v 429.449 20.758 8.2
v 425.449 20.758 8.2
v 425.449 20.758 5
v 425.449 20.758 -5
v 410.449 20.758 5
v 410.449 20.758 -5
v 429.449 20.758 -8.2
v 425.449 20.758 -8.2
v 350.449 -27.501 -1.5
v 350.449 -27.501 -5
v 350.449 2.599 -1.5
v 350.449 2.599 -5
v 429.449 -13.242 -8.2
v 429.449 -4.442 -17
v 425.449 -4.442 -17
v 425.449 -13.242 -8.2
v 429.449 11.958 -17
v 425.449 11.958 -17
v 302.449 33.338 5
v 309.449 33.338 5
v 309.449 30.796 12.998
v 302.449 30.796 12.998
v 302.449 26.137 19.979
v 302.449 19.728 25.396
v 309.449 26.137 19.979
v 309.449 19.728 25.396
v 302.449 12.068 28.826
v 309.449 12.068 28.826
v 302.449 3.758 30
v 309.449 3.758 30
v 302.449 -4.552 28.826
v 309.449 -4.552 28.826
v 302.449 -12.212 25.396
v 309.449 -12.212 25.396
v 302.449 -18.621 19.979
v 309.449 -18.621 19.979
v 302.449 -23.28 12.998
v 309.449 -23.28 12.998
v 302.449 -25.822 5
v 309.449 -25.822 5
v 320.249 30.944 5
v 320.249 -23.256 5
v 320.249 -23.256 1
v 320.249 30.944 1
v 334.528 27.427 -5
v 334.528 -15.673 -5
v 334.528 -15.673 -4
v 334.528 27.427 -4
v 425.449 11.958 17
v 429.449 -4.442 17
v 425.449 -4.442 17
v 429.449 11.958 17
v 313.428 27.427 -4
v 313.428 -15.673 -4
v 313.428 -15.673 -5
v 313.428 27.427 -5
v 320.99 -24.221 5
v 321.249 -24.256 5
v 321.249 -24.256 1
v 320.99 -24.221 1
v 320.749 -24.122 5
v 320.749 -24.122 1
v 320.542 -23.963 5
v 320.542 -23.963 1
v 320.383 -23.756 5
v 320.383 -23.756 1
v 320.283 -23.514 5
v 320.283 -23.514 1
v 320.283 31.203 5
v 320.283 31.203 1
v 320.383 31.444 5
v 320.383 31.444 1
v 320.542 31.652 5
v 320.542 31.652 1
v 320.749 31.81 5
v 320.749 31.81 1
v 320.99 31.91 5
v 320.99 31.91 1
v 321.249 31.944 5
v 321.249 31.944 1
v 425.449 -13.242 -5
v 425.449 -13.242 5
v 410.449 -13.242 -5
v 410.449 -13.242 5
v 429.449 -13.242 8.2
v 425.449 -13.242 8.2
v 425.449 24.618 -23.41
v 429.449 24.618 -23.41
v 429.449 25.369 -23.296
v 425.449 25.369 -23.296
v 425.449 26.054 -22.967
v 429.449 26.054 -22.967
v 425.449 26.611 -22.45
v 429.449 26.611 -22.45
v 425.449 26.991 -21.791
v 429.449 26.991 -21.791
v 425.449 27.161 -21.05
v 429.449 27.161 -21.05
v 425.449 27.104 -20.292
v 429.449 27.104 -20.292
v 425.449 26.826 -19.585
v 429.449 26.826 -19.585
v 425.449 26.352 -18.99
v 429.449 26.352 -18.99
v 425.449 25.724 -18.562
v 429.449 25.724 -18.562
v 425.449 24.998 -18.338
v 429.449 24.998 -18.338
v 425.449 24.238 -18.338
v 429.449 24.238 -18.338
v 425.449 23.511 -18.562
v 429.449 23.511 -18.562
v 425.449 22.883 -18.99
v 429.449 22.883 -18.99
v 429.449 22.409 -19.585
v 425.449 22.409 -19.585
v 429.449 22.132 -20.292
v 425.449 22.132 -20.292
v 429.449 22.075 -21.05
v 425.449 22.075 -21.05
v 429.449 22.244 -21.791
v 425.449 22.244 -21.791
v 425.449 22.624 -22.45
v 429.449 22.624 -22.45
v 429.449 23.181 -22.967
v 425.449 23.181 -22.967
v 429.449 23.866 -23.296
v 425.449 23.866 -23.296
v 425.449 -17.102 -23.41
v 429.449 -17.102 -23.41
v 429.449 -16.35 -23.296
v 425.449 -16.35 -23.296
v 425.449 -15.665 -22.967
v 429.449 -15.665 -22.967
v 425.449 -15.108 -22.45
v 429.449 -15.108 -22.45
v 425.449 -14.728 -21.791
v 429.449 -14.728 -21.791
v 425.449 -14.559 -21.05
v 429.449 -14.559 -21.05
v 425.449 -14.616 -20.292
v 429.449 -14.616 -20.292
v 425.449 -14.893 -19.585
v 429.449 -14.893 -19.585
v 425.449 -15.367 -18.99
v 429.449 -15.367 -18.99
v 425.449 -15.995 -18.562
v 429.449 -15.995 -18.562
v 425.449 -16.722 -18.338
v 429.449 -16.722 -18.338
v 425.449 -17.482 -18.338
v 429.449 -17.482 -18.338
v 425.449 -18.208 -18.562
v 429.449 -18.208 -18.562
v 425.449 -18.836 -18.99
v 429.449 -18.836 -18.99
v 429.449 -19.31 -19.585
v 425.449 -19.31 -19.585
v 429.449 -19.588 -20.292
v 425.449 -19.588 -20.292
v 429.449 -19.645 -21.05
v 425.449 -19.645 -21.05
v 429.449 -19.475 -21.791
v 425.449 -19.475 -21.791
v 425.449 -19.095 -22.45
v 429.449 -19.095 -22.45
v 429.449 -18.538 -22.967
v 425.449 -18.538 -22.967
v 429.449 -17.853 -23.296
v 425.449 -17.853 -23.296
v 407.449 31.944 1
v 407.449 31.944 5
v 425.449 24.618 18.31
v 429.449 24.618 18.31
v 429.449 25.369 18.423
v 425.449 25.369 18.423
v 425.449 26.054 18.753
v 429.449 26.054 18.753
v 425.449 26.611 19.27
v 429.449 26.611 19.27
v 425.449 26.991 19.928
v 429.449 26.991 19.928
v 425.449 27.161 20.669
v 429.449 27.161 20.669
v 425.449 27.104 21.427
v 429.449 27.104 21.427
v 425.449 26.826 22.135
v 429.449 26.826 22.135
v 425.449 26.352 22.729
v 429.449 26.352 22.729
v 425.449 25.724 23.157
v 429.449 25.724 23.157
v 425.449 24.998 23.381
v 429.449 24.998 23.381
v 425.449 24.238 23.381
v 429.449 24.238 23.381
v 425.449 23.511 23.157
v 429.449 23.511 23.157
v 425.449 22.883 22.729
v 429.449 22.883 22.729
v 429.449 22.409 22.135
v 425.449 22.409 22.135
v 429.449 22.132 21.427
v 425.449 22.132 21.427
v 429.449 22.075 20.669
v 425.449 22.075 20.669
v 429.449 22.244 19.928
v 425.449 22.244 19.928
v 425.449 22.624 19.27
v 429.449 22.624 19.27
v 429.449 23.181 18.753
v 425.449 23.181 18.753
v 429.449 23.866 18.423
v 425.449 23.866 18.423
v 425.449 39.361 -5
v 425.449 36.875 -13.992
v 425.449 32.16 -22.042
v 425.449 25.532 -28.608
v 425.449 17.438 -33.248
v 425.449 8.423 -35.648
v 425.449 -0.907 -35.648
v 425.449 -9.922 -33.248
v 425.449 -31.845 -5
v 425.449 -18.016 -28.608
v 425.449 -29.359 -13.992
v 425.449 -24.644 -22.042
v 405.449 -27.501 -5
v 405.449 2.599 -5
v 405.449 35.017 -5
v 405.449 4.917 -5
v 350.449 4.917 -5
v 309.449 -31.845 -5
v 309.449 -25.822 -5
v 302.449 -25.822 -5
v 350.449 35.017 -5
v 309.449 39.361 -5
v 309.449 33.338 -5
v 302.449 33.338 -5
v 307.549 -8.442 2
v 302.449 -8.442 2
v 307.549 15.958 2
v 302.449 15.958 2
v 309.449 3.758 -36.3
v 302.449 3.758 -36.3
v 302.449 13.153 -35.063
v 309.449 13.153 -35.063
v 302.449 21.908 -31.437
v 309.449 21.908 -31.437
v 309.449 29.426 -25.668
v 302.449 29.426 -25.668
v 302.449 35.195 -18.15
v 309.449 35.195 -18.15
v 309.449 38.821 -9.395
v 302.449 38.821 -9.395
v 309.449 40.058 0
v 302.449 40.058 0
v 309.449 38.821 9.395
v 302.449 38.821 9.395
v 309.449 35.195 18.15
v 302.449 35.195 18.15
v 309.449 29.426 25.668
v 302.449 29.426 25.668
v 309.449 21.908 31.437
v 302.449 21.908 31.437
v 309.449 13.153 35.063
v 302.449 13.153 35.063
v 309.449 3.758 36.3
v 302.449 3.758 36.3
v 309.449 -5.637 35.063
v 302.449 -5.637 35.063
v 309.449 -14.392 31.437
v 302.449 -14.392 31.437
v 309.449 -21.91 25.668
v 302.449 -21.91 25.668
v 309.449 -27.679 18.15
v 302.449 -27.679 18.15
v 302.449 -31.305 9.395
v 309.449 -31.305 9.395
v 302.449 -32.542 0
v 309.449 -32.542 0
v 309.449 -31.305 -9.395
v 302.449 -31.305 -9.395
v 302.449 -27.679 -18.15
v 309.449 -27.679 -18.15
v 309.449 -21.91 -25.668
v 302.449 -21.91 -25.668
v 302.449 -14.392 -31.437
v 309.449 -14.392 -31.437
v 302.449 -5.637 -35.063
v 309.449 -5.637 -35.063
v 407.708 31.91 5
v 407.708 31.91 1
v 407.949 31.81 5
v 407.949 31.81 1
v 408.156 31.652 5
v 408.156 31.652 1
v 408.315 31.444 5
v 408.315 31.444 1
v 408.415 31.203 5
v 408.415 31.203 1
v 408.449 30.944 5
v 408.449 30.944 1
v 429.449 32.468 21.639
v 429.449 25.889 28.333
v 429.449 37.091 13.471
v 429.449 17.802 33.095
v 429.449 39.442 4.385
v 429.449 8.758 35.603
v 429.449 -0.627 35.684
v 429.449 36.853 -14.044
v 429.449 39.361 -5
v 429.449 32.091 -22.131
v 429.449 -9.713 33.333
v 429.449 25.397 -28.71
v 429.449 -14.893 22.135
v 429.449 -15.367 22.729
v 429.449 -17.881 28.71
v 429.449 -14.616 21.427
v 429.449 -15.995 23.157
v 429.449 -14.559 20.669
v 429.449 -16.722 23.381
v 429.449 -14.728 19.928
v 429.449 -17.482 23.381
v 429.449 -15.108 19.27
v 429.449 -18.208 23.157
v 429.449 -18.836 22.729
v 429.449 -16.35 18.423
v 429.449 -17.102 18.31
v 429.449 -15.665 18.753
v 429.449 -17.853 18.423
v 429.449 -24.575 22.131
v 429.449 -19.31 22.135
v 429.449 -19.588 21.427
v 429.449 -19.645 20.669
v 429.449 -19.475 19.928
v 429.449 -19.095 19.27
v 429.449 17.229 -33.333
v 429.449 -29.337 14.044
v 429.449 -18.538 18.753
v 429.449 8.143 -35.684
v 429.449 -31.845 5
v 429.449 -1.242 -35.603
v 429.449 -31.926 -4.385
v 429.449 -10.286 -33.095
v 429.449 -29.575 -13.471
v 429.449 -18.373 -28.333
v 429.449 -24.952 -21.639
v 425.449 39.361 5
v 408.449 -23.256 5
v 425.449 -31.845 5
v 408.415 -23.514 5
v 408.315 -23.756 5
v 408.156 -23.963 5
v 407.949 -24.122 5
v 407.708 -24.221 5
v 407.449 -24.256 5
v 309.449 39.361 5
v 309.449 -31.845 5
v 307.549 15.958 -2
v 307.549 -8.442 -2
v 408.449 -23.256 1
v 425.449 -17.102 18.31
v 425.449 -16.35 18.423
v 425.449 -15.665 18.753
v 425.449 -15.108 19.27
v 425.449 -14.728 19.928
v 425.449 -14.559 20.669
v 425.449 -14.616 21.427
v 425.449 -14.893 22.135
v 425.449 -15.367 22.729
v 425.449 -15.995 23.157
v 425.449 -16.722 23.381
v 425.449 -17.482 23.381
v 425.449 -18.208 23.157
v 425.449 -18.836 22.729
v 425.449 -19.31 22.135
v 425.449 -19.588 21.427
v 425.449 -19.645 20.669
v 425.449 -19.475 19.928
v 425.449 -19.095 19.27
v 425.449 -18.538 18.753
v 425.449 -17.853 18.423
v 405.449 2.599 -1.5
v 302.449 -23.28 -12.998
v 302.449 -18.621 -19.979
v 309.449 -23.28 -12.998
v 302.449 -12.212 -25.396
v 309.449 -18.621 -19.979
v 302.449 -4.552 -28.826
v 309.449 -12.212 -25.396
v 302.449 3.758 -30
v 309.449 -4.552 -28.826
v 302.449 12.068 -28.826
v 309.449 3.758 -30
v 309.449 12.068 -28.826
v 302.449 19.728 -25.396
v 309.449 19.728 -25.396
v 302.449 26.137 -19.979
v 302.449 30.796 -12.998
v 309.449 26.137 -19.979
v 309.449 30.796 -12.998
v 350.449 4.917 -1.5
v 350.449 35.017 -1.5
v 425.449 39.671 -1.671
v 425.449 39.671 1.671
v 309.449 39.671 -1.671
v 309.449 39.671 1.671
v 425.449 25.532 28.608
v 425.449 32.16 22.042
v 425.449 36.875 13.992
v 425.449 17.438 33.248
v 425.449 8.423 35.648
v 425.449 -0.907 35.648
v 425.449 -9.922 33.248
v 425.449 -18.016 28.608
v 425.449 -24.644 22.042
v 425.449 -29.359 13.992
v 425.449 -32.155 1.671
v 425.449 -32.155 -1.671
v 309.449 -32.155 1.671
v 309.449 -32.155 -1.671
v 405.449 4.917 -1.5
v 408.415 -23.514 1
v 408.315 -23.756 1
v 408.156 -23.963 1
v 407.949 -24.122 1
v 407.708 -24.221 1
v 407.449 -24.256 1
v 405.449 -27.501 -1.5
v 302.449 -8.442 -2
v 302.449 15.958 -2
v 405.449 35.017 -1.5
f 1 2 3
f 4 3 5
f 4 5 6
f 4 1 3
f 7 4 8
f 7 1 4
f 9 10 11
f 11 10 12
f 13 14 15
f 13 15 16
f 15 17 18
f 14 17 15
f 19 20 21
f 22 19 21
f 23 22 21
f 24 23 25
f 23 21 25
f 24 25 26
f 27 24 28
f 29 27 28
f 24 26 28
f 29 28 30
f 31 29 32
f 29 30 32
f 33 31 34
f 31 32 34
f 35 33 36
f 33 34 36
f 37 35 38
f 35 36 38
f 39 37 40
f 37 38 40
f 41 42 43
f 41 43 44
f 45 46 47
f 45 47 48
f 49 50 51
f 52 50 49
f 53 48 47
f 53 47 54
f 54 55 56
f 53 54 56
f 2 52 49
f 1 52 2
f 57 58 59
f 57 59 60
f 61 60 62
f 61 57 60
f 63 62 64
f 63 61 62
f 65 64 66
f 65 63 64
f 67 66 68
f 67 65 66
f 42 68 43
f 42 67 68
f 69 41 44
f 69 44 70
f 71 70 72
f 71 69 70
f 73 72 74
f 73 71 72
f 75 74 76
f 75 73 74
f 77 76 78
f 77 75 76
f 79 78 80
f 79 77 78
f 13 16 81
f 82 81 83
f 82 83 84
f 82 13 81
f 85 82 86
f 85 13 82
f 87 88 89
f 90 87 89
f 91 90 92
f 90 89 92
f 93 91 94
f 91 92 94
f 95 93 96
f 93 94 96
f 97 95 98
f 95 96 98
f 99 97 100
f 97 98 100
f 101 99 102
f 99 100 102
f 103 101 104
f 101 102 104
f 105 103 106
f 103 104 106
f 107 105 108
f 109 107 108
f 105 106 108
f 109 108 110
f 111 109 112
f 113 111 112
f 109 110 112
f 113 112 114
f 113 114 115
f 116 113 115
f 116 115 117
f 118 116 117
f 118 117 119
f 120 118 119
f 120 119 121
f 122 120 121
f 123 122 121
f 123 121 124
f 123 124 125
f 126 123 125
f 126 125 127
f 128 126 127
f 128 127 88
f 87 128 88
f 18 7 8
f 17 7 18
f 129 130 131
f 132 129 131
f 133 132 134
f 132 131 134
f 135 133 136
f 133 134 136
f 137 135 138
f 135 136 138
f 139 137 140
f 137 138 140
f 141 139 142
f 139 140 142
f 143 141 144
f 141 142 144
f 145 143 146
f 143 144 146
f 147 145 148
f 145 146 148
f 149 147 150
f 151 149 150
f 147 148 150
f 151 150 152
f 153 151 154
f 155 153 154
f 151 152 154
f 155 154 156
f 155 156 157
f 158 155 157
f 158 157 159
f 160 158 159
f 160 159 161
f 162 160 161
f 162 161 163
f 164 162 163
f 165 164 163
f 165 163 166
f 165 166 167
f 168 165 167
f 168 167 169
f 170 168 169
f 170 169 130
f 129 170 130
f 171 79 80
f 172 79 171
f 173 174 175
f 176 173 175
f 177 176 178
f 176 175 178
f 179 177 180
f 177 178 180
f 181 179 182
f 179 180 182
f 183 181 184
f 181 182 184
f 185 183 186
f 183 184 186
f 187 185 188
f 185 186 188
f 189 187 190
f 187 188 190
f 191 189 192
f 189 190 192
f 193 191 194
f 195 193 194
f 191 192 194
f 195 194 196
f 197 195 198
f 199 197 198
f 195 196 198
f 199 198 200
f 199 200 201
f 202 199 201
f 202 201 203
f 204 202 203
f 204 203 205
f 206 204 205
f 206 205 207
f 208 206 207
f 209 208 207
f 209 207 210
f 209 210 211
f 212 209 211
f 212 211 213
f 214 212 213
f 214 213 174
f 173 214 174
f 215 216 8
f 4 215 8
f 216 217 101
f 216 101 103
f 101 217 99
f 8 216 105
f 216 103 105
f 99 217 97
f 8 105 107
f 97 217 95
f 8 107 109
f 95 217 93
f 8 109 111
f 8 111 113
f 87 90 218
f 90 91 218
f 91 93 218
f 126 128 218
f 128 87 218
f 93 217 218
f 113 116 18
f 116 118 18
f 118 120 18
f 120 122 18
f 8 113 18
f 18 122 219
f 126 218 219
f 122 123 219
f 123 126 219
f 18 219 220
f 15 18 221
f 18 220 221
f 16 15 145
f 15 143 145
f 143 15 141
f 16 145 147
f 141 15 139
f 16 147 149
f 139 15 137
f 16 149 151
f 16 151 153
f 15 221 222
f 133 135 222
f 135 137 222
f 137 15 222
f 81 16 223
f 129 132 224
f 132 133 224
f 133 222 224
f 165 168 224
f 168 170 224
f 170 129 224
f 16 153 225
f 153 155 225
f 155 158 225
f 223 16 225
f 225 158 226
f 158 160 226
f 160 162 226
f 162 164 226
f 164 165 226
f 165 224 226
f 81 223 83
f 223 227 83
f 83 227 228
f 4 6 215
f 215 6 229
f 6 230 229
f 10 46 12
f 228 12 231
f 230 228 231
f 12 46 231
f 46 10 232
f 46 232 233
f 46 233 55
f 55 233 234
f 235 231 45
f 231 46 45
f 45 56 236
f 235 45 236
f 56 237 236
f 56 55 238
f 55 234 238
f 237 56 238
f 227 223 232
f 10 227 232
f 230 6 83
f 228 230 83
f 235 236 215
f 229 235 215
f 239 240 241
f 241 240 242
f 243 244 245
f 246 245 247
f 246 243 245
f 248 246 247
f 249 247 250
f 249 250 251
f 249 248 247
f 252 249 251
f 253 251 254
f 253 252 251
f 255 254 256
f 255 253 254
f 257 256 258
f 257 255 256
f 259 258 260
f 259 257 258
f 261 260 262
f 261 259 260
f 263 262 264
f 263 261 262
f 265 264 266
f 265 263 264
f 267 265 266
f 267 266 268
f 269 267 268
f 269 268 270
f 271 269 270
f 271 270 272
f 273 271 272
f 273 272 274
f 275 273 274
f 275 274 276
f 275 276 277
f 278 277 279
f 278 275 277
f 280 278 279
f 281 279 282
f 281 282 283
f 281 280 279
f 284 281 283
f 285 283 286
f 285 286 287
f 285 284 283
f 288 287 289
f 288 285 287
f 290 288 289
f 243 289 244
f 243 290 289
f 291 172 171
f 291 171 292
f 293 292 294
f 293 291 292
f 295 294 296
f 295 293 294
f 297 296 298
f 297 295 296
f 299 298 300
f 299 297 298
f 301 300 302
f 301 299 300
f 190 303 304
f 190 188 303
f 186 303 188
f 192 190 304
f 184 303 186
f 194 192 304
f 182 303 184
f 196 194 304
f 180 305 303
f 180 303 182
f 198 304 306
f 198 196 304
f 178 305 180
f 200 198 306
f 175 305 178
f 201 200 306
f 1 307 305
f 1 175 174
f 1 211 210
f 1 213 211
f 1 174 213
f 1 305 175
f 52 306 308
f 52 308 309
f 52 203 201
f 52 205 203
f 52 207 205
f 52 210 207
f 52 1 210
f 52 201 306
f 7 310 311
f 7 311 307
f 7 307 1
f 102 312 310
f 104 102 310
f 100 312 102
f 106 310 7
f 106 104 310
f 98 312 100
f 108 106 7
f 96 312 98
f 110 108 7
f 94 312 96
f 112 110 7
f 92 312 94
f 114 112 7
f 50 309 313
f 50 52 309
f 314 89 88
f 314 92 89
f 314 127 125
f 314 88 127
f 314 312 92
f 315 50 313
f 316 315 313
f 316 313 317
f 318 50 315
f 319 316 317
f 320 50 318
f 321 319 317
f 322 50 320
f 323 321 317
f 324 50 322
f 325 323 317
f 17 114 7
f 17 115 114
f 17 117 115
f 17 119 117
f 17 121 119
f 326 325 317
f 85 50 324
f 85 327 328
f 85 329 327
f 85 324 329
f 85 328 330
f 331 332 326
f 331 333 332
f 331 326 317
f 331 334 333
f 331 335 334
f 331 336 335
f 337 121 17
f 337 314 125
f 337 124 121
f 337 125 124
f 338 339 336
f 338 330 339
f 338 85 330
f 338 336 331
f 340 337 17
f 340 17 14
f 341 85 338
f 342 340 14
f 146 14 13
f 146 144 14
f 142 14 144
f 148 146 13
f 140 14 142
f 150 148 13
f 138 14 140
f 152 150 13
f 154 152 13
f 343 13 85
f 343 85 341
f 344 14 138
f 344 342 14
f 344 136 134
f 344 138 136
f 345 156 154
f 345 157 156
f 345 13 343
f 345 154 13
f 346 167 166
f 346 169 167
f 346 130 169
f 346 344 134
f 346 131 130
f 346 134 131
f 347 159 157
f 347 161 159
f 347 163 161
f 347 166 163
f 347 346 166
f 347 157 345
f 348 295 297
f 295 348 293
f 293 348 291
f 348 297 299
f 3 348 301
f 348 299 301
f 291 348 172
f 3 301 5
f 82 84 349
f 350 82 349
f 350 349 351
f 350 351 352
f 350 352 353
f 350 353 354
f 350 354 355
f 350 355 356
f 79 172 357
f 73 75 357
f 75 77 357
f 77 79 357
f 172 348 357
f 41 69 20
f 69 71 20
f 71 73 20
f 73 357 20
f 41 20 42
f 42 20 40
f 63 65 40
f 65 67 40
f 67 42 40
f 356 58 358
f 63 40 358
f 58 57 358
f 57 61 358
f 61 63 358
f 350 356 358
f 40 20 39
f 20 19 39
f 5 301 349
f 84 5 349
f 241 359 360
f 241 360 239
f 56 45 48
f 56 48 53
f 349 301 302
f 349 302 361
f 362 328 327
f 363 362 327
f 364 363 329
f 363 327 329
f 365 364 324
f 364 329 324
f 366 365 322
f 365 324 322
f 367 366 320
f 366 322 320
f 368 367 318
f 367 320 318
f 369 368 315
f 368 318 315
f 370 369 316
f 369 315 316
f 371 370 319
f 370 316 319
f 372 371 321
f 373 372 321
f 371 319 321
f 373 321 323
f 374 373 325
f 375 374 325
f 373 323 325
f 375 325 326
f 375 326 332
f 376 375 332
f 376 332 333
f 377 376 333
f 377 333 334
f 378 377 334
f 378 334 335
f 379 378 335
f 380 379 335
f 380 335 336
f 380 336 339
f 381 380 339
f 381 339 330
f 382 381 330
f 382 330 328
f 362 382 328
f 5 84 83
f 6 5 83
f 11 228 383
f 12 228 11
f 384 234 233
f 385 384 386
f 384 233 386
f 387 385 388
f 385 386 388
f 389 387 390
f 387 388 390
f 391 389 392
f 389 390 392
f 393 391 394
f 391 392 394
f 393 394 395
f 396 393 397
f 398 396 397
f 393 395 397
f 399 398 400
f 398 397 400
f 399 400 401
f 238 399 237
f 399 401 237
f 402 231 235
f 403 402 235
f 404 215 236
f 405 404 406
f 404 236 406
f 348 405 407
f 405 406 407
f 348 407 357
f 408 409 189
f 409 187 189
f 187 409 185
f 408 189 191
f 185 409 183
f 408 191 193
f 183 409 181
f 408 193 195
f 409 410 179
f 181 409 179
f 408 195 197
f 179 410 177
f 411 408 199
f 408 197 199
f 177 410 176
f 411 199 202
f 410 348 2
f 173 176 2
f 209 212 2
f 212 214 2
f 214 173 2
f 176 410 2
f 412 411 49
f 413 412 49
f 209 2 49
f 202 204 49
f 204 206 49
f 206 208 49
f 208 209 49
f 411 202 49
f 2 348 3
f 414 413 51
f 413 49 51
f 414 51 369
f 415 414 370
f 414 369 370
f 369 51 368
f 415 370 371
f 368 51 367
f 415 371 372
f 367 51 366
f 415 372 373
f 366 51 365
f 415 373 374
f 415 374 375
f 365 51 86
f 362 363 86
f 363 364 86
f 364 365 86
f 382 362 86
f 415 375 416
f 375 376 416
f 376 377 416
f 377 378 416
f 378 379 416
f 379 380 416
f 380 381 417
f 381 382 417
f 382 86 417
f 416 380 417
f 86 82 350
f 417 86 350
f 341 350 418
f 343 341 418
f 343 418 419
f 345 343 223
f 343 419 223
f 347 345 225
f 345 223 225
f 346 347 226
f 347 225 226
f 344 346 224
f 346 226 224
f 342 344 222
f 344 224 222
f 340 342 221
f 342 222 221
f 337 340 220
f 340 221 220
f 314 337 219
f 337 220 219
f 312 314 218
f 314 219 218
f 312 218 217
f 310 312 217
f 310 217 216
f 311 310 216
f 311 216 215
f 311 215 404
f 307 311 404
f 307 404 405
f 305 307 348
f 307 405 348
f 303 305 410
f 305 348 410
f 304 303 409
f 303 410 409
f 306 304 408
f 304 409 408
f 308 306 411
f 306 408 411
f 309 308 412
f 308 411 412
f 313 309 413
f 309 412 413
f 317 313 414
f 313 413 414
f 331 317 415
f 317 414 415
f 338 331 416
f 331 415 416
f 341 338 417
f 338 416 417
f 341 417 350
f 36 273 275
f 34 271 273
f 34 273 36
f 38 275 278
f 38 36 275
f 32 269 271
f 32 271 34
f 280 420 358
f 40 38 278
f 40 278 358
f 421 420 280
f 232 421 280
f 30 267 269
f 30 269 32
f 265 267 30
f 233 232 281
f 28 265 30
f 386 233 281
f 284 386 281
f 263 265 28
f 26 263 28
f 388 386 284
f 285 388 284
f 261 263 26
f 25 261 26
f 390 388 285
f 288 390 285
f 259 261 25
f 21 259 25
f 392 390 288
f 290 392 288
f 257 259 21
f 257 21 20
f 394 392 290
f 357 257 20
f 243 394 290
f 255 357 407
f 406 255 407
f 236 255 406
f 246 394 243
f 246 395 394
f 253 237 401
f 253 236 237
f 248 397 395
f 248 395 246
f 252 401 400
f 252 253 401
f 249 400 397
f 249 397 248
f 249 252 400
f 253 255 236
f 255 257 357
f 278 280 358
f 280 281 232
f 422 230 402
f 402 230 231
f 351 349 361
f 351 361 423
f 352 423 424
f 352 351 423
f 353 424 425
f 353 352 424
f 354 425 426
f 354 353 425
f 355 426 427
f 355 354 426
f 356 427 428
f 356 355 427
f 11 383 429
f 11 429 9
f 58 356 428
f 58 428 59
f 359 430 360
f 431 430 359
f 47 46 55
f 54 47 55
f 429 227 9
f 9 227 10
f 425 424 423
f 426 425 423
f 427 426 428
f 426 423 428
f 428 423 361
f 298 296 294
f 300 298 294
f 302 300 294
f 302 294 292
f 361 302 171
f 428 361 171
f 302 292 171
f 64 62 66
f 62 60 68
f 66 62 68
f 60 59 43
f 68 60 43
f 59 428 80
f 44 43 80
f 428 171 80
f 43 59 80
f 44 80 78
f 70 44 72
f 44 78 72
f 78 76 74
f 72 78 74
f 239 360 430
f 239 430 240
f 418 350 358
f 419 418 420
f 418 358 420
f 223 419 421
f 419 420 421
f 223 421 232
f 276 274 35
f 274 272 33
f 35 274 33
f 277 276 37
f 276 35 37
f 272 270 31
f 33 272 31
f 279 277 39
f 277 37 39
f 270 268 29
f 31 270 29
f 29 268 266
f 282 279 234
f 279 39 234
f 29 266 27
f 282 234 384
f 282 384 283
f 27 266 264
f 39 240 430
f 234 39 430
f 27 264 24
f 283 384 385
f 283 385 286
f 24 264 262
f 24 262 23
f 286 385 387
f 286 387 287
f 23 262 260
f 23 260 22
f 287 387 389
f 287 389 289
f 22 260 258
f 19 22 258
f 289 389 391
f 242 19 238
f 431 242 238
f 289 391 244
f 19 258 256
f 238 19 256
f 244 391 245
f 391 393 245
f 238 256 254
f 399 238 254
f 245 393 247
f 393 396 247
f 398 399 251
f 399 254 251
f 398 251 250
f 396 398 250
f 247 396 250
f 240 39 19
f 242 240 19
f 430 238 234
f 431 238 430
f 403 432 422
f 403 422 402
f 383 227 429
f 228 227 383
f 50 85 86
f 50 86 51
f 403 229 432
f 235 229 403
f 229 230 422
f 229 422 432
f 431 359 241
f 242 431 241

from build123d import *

# Parameters (mm, degrees)
CUT_EXTRUDE1_DEPTH      = 212.88306668
BOSS_EXTRUDE2_DEPTH     = 139.7
SKETCH9_R               = 35.95202499
BOSS_EXTRUDE3_DEPTH     = 4
CUT_EXTRUDE2_DEPTH      = 4
SKETCH11_W              = 10
SKETCH11_H              = 34
CUT_EXTRUDE3_DEPTH      = 15
RASPBERRY_PI_5_DEPTH    = 4
GPS_SLOT_DEPTH          = 5.1
SKETCH14_W              = 10
SKETCH14_H              = 16
MPU_DEPTH               = 434.220724454
ALTIMETER_DEPTH         = 434.220724454
ALTIMETER_DEPTH_BACK    = 3.54
SKETCH15_W              = 20
SKETCH15_H              = 15.34
SKETCH16_W              = 62.2
SKETCH16_H              = 25.5
PCA9685_DEPTH           = 2
SKETCH17_W              = 50
SKETCH17_H              = 27
ESP_32_1_DEPTH          = 5
SKETCH18_W              = 55
SKETCH18_H              = 30.1
BATTERY_1_DEPTH         = 3.5
SKETCH21_W              = 55
SKETCH21_H              = 30.1
BATTERY_2_DEPTH         = 3.5
SKETCH24_W              = 50
SKETCH24_H              = 27
ESP_32_MESHTASTIC_DEPTH = 5
SKETCH25_W              = 21.1
SKETCH25_H              = 43.1
STEP_DOWN_DEPTH         = 1
SKETCH26_W              = 50
SKETCH26_H              = 27
ESP_32_2_DEPTH          = 5
BOSS_EXTRUDE4_START     = -120
SKETCH27_R              = 36.3
SKETCH27_R_2            = 30
BOSS_EXTRUDE4_DEPTH     = 7
CUT_EXTRUDE4_START      = -127
SKETCH29_R              = 36.3
CUT_EXTRUDE4_DEPTH      = 226.865446219
SKETCH30_W              = 4
SKETCH30_H              = 24.4
CUT_EXTRUDE5_DEPTH      = 5.1
CUT_EXTRUDE6_REACH      = 140.027
SKETCH31_R              = 2.55


with BuildPart() as part:
    # Sketch3 → Revolve1 (revolve)
    with BuildSketch(Plane.XY):
        with BuildLine():
            Line((285.74876522, 39.710021262), (285.74876522, 3.757996272))
            Line((285.74876522, 3.757996272), (80.74876522, 3.757996272))
            Line((80.74876522, 3.757996272), (80.74876522, 19.634316044))
            add(Edge.make_bspline(
                [(80.74876522, 19.634316044), (82.347112552, 19.950400666), (85.636412123, 20.593859316), (92.311794173, 21.870421625), (109.164486257, 24.943674568), (127.867996046, 27.977765645), (146.633052135, 30.604670801), (163.733801994, 32.658467989), (174.004488004, 33.801497199), (184.284802392, 34.855212792), (194.57611333, 35.797171826), (204.876878825, 36.627240946), (213.466527777, 37.244314669), (220.34120026, 37.693162367), (227.218898943, 38.097179671), (233.238636081, 38.411453209), (238.400481516, 38.652791264), (242.701722554, 38.8352093), (246.145182192, 38.969923968), (249.584994627, 39.093417446), (253.03241088, 39.20568842), (256.467961578, 39.306735697), (259.924132141, 39.396558203), (263.346991762, 39.475154984), (266.82565511, 39.542525204), (270.211898057, 39.598668148), (273.756466178, 39.643583219), (276.60509147, 39.673059099), (279.43950326, 39.691306197), (281.597603414, 39.703938851), (283.942998009, 39.708617629), (285.03032454, 39.710021262), (285.74876522, 39.710021262)],
                knots=[0.322773044, 0.322773044, 0.322773044, 0.322773044, 0.322773044, 0.341563488, 0.3614269, 0.401153715, 0.520334158, 0.56006097, 0.579924379, 0.599787787, 0.639514601, 0.679241414, 0.699104823, 0.718968231, 0.738831638, 0.758695045, 0.778558452, 0.788490156, 0.798421859, 0.808353563, 0.818285267, 0.828216971, 0.838148675, 0.848080378, 0.858012082, 0.867943786, 0.87787549, 0.887807193, 0.897738897, 0.902704749, 0.9076706, 0.917602304, 0.917602304, 0.917602304, 0.917602304, 0.917602304], degree=4))
        make_face()
    revolve(axis=Axis((285.74876522, 3.757996272, 0), (-1, 0, 0)))

    # Sketch6 → Cut-Extrude1 (cut, through all)
    with BuildSketch(Plane(origin=(285.74876522, 0, 0), x_dir=(0, 0, -1), z_dir=(1, 0, 0))):
        with BuildLine():
            Line((-5, -31.844645496), (-5, 39.36063804))
            ThreePointArc((-5, 39.360638041), (-35.95202499, 3.757996272), (-5, -31.844645496))
        make_face()
        with BuildLine():
            ThreePointArc((35.95202499, 3.757996272), (27.132160123, 27.346001444), (5, 39.36063804))
            Line((5, 39.36063804), (5, -31.844645496))
            ThreePointArc((5, -31.844645496), (27.132160123, -19.830008899), (35.95202499, 3.757996272))
        make_face()
    extrude(amount=-CUT_EXTRUDE1_DEPTH, mode=Mode.SUBTRACT)

    # Sketch8 → Boss-Extrude2 (add)
    with BuildSketch(Plane(origin=(285.74876522, 0, 0), x_dir=(0, 0, -1), z_dir=(1, 0, 0))):
        with BuildLine():
            Line((5, -31.844645496), (5, 39.360638041))
            ThreePointArc((5, 39.360638041), (0, 39.710021262), (-5, 39.360638041))
            Line((-5, 39.360638041), (-5, -31.844645496))
            ThreePointArc((-5, -31.844645496), (0, -32.194028718), (5, -31.844645496))
        make_face()
    extrude(amount=BOSS_EXTRUDE2_DEPTH)

    # Sketch9 → Boss-Extrude3 (add)
    with BuildSketch(Plane(origin=(425.44876522, 0, 0), x_dir=(0, 0, -1), z_dir=(1, 0, 0))):
        with Locations(Location((0, 3.757996272, 0), (0, 0, 262.00572083))):
            Circle(SKETCH9_R)
    extrude(amount=BOSS_EXTRUDE3_DEPTH)

    # Sketch10 → Cut-Extrude2 (cut)
    with BuildSketch(Plane(origin=(429.44876522, 0, 0), x_dir=(0, 0, -1), z_dir=(1, 0, 0))):
        Polygon((-17, -4.442003728), (-17, 11.957996272), (-8.2, 20.757996272), (8.2, 20.757996272), (17, 11.957996272), (17, -4.442003728), (8.2, -13.242003728), (-8.2, -13.242003728), align=None)
    extrude(amount=-CUT_EXTRUDE2_DEPTH, mode=Mode.SUBTRACT)

    # Sketch11 → Cut-Extrude3 (cut)
    with BuildSketch(Plane(origin=(425.44876522, 0, 0), x_dir=(0, 0, -1), z_dir=(1, 0, 0))):
        with Locations((0, 3.757996272)):
            Rectangle(SKETCH11_W, SKETCH11_H)
    extrude(amount=-CUT_EXTRUDE3_DEPTH, mode=Mode.SUBTRACT)

    # Sketch12 → Raspberry Pi 5 (cut)
    with BuildSketch(Plane.XY.offset(5)):
        with BuildLine():
            Line((407.44876522, -24.255570554), (321.24876522, -24.255570554))
            ThreePointArc((321.24876522, -24.255570554), (320.541658439, -23.962677335), (320.24876522, -23.255570554))
            Line((320.24876522, -23.255570554), (320.24876522, 30.944429446))
            ThreePointArc((320.24876522, 30.944429446), (320.541658439, 31.651536227), (321.24876522, 31.944429446))
            Line((321.24876522, 31.944429446), (407.44876522, 31.944429446))
            ThreePointArc((407.44876522, 31.944429446), (408.155872001, 31.651536227), (408.44876522, 30.944429446))
            Line((408.44876522, 30.944429446), (408.44876522, -23.255570554))
            ThreePointArc((408.44876522, -23.255570554), (408.155872001, -23.962677335), (407.44876522, -24.255570554))
        make_face()
    extrude(amount=-RASPBERRY_PI_5_DEPTH, mode=Mode.SUBTRACT)

    # Sketch13 → GPS Slot (cut)
    with BuildSketch(Plane.XY.offset(5)):
        with BuildLine():
            Line((294.985699539, 8.990821657), (262.335699539, 8.990821657))
            ThreePointArc((262.335699539, 8.990821657), (261.628592757, 9.283714876), (261.335699539, 9.990821657))
            Line((261.335699539, 9.990821657), (261.335699539, 33.590821657))
            ThreePointArc((261.335699539, 33.590821657), (261.628592757, 34.297928438), (262.335699539, 34.590821657))
            Line((262.335699539, 34.590821657), (294.985699539, 34.590821657))
            ThreePointArc((294.985699539, 34.590821657), (295.69280632, 34.297928438), (295.985699539, 33.590821657))
            Line((295.985699539, 33.590821657), (295.985699539, 9.990821657))
            ThreePointArc((295.985699539, 9.990821657), (295.69280632, 9.283714876), (294.985699539, 8.990821657))
        make_face()
    extrude(amount=-GPS_SLOT_DEPTH, mode=Mode.SUBTRACT)

    # Sketch14 → MPU (cut, through all)
    with BuildSketch(Plane.XY.offset(5)):
        with Locations((277.879699021, -20.106936119)):
            Rectangle(SKETCH14_W, SKETCH14_H)
    extrude(amount=-MPU_DEPTH, mode=Mode.SUBTRACT)

    # Sketch15 → Altimeter (cut, two sides: drawn at the far end of the back side and taken through both)
    with BuildSketch(Plane.XY.offset(5).offset(-ALTIMETER_DEPTH_BACK)):
        with Locations((285.717294066, -1.841089471)):
            Rectangle(SKETCH15_W, SKETCH15_H)
    extrude(amount=ALTIMETER_DEPTH + ALTIMETER_DEPTH_BACK, mode=Mode.SUBTRACT)

    # Sketch16 → PCA9685 (cut)
    with BuildSketch(Plane.XY.offset(5)):
        with Locations((132.808150825, 3.59036767)):
            Rectangle(SKETCH16_W, SKETCH16_H)
    extrude(amount=-PCA9685_DEPTH, mode=Mode.SUBTRACT)

    # Sketch17 → ESP-32 (1) (cut)
    with BuildSketch(Plane.XY.offset(5)):
        with Locations((233.402571461, -10.513286129)):
            Rectangle(SKETCH17_W, SKETCH17_H)
    extrude(amount=-ESP_32_1_DEPTH, mode=Mode.SUBTRACT)

    # Sketch18 → Battery 1 (cut)
    with BuildSketch(Plane(origin=(0, 0, -5), x_dir=(-1, 0, 0), z_dir=(0, 0, -1))):
        with Locations((-377.94876522, 19.967269146)):
            Rectangle(SKETCH18_W, SKETCH18_H)
    extrude(amount=-BATTERY_1_DEPTH, mode=Mode.SUBTRACT)

    # Sketch21 → Battery 2 (cut)
    with BuildSketch(Plane(origin=(0, 0, -5), x_dir=(-1, 0, 0), z_dir=(0, 0, -1))):
        with Locations((-377.94876522, -12.451276601)):
            Rectangle(SKETCH21_W, SKETCH21_H)
    extrude(amount=-BATTERY_2_DEPTH, mode=Mode.SUBTRACT)

    # Sketch24 → ESP-32 (Meshtastic) (cut)
    with BuildSketch(Plane(origin=(0, 0, -5), x_dir=(-1, 0, 0), z_dir=(0, 0, -1))):
        with Locations((-233.841762832, 18.555689361)):
            Rectangle(SKETCH24_W, SKETCH24_H)
    extrude(amount=-ESP_32_MESHTASTIC_DEPTH, mode=Mode.SUBTRACT)

    # Sketch25 → Step Down (cut)
    with BuildSketch(Plane(origin=(0, 0, -5), x_dir=(-1, 0, 0), z_dir=(0, 0, -1))):
        with Locations((-323.977591294, 5.876880331)):
            Rectangle(SKETCH25_W, SKETCH25_H)
    extrude(amount=-STEP_DOWN_DEPTH, mode=Mode.SUBTRACT)

    # Sketch26 → ESP-32 (2) (cut)
    with BuildSketch(Plane(origin=(0, 0, -5), x_dir=(-1, 0, 0), z_dir=(0, 0, -1))):
        with Locations((-165.478674332, 3.198326217)):
            Rectangle(SKETCH26_W, SKETCH26_H)
    extrude(amount=-ESP_32_2_DEPTH, mode=Mode.SUBTRACT)

    # Sketch27 → Boss-Extrude4 (add)
    with BuildSketch(Plane(origin=(429.44876522, 0, 0), x_dir=(0, 0, -1), z_dir=(1, 0, 0)).offset(BOSS_EXTRUDE4_START)):
        with Locations((0, 3.757996272)):
            Circle(SKETCH27_R)
        with Locations((0, 3.757996272)):
            Circle(SKETCH27_R_2, mode=Mode.SUBTRACT)
    extrude(amount=-BOSS_EXTRUDE4_DEPTH)

    # Sketch29 → Cut-Extrude4 (cut, through all)
    with BuildSketch(Plane(origin=(429.44876522, 0, 0), x_dir=(0, 0, -1), z_dir=(1, 0, 0)).offset(CUT_EXTRUDE4_START)):
        with Locations((0, 3.757996272)):
            Circle(SKETCH29_R)
    extrude(amount=-CUT_EXTRUDE4_DEPTH, mode=Mode.SUBTRACT)

    # Sketch30 → Cut-Extrude5 (cut)
    with BuildSketch(Plane.ZY.offset(-302.44876522)):
        with Locations((0, 3.757996272)):
            Rectangle(SKETCH30_W, SKETCH30_H)
    extrude(amount=-CUT_EXTRUDE5_DEPTH, mode=Mode.SUBTRACT)

    # Sketch31 → Cut-Extrude6 (cut, up to next)
    with BuildSketch(Plane(origin=(429.44876522, 0, 0), x_dir=(0, 0, -1), z_dir=(1, 0, 0)), mode=Mode.PRIVATE) as cut_extrude6_sk1:
        with Locations((20.859650045, 24.617646317)):
            Circle(SKETCH31_R)
    cut_extrude6_tool1 = extrude(cut_extrude6_sk1.sketch, amount=-CUT_EXTRUDE6_REACH, mode=Mode.PRIVATE) & part.part
    # Sketch31 → Cut-Extrude6 (cut, up to next)
    with BuildSketch(Plane(origin=(429.44876522, 0, 0), x_dir=(0, 0, -1), z_dir=(1, 0, 0)), mode=Mode.PRIVATE) as cut_extrude6_sk2:
        with Locations((-20.859650045, 24.617646317)):
            Circle(SKETCH31_R)
    cut_extrude6_tool2 = extrude(cut_extrude6_sk2.sketch, amount=-CUT_EXTRUDE6_REACH, mode=Mode.PRIVATE) & part.part
    # Sketch31 → Cut-Extrude6 (cut, up to next)
    with BuildSketch(Plane(origin=(429.44876522, 0, 0), x_dir=(0, 0, -1), z_dir=(1, 0, 0)), mode=Mode.PRIVATE) as cut_extrude6_sk3:
        with Locations((-20.859650045, -17.101653773)):
            Circle(SKETCH31_R)
    cut_extrude6_tool3 = extrude(cut_extrude6_sk3.sketch, amount=-CUT_EXTRUDE6_REACH, mode=Mode.PRIVATE) & part.part
    # Sketch31 → Cut-Extrude6 (cut, up to next)
    with BuildSketch(Plane(origin=(429.44876522, 0, 0), x_dir=(0, 0, -1), z_dir=(1, 0, 0)), mode=Mode.PRIVATE) as cut_extrude6_sk4:
        with Locations((20.859650045, -17.101653773)):
            Circle(SKETCH31_R)
    cut_extrude6_tool4 = extrude(cut_extrude6_sk4.sketch, amount=-CUT_EXTRUDE6_REACH, mode=Mode.PRIVATE) & part.part
    add(cut_extrude6_tool1.solids().sort_by_distance((429.448765, 24.617646, -20.85965))[0], mode=Mode.SUBTRACT)
    add(cut_extrude6_tool2.solids().sort_by_distance((429.448765, 24.617646, 20.85965))[0], mode=Mode.SUBTRACT)
    add(cut_extrude6_tool3.solids().sort_by_distance((429.448765, -17.101654, 20.85965))[0], mode=Mode.SUBTRACT)
    add(cut_extrude6_tool4.solids().sort_by_distance((429.448765, -17.101654, -20.85965))[0], mode=Mode.SUBTRACT)


solid = part.part
